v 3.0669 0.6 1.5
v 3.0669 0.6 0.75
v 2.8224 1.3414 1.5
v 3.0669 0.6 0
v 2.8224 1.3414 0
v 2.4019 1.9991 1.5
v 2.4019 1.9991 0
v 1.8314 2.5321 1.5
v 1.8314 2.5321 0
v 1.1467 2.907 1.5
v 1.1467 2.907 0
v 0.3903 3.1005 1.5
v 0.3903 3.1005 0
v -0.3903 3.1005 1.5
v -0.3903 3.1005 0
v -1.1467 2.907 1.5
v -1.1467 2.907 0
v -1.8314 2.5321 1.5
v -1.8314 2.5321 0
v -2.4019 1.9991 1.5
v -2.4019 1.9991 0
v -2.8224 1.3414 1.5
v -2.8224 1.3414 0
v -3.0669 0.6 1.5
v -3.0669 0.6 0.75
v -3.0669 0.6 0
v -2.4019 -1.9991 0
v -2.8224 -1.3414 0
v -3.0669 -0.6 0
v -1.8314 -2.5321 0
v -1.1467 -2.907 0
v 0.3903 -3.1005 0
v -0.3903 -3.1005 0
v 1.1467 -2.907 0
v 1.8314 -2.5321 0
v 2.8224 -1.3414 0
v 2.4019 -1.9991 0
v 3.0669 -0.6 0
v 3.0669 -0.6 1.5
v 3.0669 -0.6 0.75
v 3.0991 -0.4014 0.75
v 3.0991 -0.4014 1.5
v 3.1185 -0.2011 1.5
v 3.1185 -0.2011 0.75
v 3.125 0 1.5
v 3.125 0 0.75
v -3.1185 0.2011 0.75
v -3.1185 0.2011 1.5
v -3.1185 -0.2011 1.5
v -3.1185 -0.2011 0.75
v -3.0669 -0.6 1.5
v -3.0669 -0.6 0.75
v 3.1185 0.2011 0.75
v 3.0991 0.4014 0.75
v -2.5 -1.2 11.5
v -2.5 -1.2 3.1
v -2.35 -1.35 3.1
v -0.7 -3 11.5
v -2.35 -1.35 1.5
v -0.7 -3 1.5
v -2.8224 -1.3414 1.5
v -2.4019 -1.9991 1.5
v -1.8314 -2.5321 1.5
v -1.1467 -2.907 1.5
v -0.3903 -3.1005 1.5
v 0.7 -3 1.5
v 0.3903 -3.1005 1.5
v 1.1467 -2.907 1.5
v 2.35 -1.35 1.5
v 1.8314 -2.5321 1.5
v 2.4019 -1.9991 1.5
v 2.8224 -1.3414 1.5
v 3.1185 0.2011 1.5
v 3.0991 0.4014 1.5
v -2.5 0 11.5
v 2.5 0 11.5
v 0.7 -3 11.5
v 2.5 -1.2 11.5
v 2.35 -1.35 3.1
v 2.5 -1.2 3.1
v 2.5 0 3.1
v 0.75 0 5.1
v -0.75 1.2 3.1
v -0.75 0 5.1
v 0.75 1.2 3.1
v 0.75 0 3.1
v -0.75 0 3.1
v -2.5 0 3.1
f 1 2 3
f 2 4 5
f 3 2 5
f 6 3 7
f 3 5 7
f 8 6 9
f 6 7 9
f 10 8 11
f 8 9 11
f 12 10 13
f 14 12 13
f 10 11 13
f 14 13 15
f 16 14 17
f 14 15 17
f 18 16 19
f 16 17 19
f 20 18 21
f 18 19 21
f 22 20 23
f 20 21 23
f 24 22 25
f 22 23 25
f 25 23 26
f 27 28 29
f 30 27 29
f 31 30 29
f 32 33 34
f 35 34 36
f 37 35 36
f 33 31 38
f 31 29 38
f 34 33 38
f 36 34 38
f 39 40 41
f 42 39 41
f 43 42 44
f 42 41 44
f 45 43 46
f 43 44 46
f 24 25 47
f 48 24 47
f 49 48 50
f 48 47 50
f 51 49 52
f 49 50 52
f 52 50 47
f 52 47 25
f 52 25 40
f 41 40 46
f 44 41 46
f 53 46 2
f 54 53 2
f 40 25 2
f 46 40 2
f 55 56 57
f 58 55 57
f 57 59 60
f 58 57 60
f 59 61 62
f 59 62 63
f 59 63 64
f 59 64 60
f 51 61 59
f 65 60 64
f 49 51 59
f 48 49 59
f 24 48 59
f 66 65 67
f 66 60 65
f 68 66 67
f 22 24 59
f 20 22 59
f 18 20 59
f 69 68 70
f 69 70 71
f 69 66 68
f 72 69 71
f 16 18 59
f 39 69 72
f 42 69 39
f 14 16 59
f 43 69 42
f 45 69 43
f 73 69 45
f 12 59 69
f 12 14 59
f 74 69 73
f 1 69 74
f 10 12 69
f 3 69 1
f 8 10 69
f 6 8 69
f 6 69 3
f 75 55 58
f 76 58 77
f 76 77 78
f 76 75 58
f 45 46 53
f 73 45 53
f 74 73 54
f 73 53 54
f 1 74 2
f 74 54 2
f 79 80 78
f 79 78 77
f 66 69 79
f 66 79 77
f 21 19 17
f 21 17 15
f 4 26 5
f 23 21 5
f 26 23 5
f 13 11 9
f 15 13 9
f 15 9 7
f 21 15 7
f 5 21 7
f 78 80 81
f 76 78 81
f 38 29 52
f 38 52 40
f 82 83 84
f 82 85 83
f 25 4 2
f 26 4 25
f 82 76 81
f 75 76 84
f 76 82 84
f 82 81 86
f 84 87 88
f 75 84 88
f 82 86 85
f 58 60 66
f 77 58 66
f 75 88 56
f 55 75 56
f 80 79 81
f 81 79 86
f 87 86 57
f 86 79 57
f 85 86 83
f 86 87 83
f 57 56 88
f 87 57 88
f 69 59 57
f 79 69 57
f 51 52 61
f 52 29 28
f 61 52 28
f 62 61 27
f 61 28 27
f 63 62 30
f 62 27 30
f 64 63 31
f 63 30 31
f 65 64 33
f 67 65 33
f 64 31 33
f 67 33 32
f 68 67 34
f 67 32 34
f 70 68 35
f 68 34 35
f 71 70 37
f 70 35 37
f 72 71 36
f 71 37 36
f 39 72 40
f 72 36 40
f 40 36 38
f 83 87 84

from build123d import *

# Parameters (mm, degrees)
F1_DEPTH      = 1.5
F2_DEPTH      = 0.75
F4_DEPTH      = 10
F5_T1_DEPTH   = 14.6290293783
F6_W          = 1.35
F6_H          = 1.6
F7_DEPTH      = 3.126
F7_DEPTH_BACK = 25
F9_DEPTH      = 0.75


# Not quite as in the source:
# - a fillet or chamfer that OpenCascade refuses, or shapes differently, is made with other operations: its cross-section is extruded or revolved along the edge and cut away or added


with BuildPart() as f1:
    # F0 (on Top) → F1 (new body)
    with BuildSketch(Plane.XY):
        with BuildLine():
            Line((-3.0668591425, 0.6), (3.0668591425, 0.6))
            ThreePointArc((3.0668591425, 0.6), (0, 3.125), (-3.0668591425, 0.6))
        make_face()
        with BuildLine():
            ThreePointArc((3.0668591425, -0.6), (3.1104308239, -0.3014051921), (3.125, 0))
            ThreePointArc((3.125, 0), (3.1104308239, 0.3014051921), (3.0668591425, 0.6))
            Line((3.0668591425, 0.6), (-3.0668591425, 0.6))
            ThreePointArc((-3.0668591425, 0.6), (-3.125, 0), (-3.0668591425, -0.6))
            Line((-3.0668591425, -0.6), (3.0668591425, -0.6))
        make_face()
        with BuildLine():
            ThreePointArc((-3.0668591425, -0.6), (0, -3.125), (3.0668591425, -0.6))
            Line((3.0668591425, -0.6), (-3.0668591425, -0.6))
        make_face()
    extrude(amount=F1_DEPTH)

    # F0 (on Top) → F2 (cut)
    with BuildSketch(Plane.XY):
        with BuildLine():
            ThreePointArc((3.0668591425, -0.6), (3.1104308239, -0.3014051921), (3.125, 0))
            ThreePointArc((3.125, 0), (3.1104308239, 0.3014051921), (3.0668591425, 0.6))
            Line((3.0668591425, 0.6), (-3.0668591425, 0.6))
            ThreePointArc((-3.0668591425, 0.6), (-3.125, 0), (-3.0668591425, -0.6))
            Line((-3.0668591425, -0.6), (3.0668591425, -0.6))
        make_face()
    extrude(amount=F2_DEPTH, mode=Mode.SUBTRACT)

    # F3 (on face) → F4 (join)
    with BuildSketch(Plane.XY.offset(1.5)):
        with BuildLine():
            ThreePointArc((-0.875, -3), (-1.7787811838, -2.5693505989), (-2.5, -1.875))
            Line((-2.5, -1.875), (-2.5, -3))
            Line((-2.5, -3), (-0.875, -3))
        make_face()
        with BuildLine():
            Line((2.5, 0), (-2.5, 0))
            Line((-2.5, 0), (-2.5, -1.875))
            ThreePointArc((-2.5, -1.875), (-1.7787811838, -2.5693505989), (-0.875, -3))
            Line((-0.875, -3), (0.875, -3))
            ThreePointArc((0.875, -3), (1.7787811838, -2.5693505989), (2.5, -1.875))
            Line((2.5, -1.875), (2.5, 0))
        make_face()
        with BuildLine():
            Line((2.5, -3), (2.5, -1.875))
            ThreePointArc((2.5, -1.875), (1.7787811838, -2.5693505989), (0.875, -3))
            Line((0.875, -3), (2.5, -3))
        make_face()
    extrude(amount=F4_DEPTH)

    # F5: chamfer of 1.8 on 2 edges, made by hand

    # F5_s2 → F5_t1 (cut)
    with BuildSketch(Plane.XY.offset(1.5)):
        Polygon((-2.5, -1.2), (-0.7, -3), (-2.5, -3), align=None)
        Polygon((2.5, -1.2), (0.7, -3), (2.5, -3), align=None)
    extrude(amount=F5_T1_DEPTH, mode=Mode.SUBTRACT)

    # F6 (on Right) → F7 (cut, two sides)
    with BuildSketch(Plane.YZ) as f7_sk:
        with Locations((-0.675, 2.3)):
            Rectangle(F6_W, F6_H)
    extrude(amount=-F7_DEPTH, mode=Mode.SUBTRACT)
    extrude(f7_sk.sketch, amount=F7_DEPTH_BACK, mode=Mode.SUBTRACT)

    # F8 (on Right) → F9 (join, symmetric)
    with BuildSketch(Plane.YZ):
        Polygon((0, 5.1), (0, 3.1), (1.2, 3.1), align=None)
    extrude(amount=F9_DEPTH, both=True)


solid = f1.part
